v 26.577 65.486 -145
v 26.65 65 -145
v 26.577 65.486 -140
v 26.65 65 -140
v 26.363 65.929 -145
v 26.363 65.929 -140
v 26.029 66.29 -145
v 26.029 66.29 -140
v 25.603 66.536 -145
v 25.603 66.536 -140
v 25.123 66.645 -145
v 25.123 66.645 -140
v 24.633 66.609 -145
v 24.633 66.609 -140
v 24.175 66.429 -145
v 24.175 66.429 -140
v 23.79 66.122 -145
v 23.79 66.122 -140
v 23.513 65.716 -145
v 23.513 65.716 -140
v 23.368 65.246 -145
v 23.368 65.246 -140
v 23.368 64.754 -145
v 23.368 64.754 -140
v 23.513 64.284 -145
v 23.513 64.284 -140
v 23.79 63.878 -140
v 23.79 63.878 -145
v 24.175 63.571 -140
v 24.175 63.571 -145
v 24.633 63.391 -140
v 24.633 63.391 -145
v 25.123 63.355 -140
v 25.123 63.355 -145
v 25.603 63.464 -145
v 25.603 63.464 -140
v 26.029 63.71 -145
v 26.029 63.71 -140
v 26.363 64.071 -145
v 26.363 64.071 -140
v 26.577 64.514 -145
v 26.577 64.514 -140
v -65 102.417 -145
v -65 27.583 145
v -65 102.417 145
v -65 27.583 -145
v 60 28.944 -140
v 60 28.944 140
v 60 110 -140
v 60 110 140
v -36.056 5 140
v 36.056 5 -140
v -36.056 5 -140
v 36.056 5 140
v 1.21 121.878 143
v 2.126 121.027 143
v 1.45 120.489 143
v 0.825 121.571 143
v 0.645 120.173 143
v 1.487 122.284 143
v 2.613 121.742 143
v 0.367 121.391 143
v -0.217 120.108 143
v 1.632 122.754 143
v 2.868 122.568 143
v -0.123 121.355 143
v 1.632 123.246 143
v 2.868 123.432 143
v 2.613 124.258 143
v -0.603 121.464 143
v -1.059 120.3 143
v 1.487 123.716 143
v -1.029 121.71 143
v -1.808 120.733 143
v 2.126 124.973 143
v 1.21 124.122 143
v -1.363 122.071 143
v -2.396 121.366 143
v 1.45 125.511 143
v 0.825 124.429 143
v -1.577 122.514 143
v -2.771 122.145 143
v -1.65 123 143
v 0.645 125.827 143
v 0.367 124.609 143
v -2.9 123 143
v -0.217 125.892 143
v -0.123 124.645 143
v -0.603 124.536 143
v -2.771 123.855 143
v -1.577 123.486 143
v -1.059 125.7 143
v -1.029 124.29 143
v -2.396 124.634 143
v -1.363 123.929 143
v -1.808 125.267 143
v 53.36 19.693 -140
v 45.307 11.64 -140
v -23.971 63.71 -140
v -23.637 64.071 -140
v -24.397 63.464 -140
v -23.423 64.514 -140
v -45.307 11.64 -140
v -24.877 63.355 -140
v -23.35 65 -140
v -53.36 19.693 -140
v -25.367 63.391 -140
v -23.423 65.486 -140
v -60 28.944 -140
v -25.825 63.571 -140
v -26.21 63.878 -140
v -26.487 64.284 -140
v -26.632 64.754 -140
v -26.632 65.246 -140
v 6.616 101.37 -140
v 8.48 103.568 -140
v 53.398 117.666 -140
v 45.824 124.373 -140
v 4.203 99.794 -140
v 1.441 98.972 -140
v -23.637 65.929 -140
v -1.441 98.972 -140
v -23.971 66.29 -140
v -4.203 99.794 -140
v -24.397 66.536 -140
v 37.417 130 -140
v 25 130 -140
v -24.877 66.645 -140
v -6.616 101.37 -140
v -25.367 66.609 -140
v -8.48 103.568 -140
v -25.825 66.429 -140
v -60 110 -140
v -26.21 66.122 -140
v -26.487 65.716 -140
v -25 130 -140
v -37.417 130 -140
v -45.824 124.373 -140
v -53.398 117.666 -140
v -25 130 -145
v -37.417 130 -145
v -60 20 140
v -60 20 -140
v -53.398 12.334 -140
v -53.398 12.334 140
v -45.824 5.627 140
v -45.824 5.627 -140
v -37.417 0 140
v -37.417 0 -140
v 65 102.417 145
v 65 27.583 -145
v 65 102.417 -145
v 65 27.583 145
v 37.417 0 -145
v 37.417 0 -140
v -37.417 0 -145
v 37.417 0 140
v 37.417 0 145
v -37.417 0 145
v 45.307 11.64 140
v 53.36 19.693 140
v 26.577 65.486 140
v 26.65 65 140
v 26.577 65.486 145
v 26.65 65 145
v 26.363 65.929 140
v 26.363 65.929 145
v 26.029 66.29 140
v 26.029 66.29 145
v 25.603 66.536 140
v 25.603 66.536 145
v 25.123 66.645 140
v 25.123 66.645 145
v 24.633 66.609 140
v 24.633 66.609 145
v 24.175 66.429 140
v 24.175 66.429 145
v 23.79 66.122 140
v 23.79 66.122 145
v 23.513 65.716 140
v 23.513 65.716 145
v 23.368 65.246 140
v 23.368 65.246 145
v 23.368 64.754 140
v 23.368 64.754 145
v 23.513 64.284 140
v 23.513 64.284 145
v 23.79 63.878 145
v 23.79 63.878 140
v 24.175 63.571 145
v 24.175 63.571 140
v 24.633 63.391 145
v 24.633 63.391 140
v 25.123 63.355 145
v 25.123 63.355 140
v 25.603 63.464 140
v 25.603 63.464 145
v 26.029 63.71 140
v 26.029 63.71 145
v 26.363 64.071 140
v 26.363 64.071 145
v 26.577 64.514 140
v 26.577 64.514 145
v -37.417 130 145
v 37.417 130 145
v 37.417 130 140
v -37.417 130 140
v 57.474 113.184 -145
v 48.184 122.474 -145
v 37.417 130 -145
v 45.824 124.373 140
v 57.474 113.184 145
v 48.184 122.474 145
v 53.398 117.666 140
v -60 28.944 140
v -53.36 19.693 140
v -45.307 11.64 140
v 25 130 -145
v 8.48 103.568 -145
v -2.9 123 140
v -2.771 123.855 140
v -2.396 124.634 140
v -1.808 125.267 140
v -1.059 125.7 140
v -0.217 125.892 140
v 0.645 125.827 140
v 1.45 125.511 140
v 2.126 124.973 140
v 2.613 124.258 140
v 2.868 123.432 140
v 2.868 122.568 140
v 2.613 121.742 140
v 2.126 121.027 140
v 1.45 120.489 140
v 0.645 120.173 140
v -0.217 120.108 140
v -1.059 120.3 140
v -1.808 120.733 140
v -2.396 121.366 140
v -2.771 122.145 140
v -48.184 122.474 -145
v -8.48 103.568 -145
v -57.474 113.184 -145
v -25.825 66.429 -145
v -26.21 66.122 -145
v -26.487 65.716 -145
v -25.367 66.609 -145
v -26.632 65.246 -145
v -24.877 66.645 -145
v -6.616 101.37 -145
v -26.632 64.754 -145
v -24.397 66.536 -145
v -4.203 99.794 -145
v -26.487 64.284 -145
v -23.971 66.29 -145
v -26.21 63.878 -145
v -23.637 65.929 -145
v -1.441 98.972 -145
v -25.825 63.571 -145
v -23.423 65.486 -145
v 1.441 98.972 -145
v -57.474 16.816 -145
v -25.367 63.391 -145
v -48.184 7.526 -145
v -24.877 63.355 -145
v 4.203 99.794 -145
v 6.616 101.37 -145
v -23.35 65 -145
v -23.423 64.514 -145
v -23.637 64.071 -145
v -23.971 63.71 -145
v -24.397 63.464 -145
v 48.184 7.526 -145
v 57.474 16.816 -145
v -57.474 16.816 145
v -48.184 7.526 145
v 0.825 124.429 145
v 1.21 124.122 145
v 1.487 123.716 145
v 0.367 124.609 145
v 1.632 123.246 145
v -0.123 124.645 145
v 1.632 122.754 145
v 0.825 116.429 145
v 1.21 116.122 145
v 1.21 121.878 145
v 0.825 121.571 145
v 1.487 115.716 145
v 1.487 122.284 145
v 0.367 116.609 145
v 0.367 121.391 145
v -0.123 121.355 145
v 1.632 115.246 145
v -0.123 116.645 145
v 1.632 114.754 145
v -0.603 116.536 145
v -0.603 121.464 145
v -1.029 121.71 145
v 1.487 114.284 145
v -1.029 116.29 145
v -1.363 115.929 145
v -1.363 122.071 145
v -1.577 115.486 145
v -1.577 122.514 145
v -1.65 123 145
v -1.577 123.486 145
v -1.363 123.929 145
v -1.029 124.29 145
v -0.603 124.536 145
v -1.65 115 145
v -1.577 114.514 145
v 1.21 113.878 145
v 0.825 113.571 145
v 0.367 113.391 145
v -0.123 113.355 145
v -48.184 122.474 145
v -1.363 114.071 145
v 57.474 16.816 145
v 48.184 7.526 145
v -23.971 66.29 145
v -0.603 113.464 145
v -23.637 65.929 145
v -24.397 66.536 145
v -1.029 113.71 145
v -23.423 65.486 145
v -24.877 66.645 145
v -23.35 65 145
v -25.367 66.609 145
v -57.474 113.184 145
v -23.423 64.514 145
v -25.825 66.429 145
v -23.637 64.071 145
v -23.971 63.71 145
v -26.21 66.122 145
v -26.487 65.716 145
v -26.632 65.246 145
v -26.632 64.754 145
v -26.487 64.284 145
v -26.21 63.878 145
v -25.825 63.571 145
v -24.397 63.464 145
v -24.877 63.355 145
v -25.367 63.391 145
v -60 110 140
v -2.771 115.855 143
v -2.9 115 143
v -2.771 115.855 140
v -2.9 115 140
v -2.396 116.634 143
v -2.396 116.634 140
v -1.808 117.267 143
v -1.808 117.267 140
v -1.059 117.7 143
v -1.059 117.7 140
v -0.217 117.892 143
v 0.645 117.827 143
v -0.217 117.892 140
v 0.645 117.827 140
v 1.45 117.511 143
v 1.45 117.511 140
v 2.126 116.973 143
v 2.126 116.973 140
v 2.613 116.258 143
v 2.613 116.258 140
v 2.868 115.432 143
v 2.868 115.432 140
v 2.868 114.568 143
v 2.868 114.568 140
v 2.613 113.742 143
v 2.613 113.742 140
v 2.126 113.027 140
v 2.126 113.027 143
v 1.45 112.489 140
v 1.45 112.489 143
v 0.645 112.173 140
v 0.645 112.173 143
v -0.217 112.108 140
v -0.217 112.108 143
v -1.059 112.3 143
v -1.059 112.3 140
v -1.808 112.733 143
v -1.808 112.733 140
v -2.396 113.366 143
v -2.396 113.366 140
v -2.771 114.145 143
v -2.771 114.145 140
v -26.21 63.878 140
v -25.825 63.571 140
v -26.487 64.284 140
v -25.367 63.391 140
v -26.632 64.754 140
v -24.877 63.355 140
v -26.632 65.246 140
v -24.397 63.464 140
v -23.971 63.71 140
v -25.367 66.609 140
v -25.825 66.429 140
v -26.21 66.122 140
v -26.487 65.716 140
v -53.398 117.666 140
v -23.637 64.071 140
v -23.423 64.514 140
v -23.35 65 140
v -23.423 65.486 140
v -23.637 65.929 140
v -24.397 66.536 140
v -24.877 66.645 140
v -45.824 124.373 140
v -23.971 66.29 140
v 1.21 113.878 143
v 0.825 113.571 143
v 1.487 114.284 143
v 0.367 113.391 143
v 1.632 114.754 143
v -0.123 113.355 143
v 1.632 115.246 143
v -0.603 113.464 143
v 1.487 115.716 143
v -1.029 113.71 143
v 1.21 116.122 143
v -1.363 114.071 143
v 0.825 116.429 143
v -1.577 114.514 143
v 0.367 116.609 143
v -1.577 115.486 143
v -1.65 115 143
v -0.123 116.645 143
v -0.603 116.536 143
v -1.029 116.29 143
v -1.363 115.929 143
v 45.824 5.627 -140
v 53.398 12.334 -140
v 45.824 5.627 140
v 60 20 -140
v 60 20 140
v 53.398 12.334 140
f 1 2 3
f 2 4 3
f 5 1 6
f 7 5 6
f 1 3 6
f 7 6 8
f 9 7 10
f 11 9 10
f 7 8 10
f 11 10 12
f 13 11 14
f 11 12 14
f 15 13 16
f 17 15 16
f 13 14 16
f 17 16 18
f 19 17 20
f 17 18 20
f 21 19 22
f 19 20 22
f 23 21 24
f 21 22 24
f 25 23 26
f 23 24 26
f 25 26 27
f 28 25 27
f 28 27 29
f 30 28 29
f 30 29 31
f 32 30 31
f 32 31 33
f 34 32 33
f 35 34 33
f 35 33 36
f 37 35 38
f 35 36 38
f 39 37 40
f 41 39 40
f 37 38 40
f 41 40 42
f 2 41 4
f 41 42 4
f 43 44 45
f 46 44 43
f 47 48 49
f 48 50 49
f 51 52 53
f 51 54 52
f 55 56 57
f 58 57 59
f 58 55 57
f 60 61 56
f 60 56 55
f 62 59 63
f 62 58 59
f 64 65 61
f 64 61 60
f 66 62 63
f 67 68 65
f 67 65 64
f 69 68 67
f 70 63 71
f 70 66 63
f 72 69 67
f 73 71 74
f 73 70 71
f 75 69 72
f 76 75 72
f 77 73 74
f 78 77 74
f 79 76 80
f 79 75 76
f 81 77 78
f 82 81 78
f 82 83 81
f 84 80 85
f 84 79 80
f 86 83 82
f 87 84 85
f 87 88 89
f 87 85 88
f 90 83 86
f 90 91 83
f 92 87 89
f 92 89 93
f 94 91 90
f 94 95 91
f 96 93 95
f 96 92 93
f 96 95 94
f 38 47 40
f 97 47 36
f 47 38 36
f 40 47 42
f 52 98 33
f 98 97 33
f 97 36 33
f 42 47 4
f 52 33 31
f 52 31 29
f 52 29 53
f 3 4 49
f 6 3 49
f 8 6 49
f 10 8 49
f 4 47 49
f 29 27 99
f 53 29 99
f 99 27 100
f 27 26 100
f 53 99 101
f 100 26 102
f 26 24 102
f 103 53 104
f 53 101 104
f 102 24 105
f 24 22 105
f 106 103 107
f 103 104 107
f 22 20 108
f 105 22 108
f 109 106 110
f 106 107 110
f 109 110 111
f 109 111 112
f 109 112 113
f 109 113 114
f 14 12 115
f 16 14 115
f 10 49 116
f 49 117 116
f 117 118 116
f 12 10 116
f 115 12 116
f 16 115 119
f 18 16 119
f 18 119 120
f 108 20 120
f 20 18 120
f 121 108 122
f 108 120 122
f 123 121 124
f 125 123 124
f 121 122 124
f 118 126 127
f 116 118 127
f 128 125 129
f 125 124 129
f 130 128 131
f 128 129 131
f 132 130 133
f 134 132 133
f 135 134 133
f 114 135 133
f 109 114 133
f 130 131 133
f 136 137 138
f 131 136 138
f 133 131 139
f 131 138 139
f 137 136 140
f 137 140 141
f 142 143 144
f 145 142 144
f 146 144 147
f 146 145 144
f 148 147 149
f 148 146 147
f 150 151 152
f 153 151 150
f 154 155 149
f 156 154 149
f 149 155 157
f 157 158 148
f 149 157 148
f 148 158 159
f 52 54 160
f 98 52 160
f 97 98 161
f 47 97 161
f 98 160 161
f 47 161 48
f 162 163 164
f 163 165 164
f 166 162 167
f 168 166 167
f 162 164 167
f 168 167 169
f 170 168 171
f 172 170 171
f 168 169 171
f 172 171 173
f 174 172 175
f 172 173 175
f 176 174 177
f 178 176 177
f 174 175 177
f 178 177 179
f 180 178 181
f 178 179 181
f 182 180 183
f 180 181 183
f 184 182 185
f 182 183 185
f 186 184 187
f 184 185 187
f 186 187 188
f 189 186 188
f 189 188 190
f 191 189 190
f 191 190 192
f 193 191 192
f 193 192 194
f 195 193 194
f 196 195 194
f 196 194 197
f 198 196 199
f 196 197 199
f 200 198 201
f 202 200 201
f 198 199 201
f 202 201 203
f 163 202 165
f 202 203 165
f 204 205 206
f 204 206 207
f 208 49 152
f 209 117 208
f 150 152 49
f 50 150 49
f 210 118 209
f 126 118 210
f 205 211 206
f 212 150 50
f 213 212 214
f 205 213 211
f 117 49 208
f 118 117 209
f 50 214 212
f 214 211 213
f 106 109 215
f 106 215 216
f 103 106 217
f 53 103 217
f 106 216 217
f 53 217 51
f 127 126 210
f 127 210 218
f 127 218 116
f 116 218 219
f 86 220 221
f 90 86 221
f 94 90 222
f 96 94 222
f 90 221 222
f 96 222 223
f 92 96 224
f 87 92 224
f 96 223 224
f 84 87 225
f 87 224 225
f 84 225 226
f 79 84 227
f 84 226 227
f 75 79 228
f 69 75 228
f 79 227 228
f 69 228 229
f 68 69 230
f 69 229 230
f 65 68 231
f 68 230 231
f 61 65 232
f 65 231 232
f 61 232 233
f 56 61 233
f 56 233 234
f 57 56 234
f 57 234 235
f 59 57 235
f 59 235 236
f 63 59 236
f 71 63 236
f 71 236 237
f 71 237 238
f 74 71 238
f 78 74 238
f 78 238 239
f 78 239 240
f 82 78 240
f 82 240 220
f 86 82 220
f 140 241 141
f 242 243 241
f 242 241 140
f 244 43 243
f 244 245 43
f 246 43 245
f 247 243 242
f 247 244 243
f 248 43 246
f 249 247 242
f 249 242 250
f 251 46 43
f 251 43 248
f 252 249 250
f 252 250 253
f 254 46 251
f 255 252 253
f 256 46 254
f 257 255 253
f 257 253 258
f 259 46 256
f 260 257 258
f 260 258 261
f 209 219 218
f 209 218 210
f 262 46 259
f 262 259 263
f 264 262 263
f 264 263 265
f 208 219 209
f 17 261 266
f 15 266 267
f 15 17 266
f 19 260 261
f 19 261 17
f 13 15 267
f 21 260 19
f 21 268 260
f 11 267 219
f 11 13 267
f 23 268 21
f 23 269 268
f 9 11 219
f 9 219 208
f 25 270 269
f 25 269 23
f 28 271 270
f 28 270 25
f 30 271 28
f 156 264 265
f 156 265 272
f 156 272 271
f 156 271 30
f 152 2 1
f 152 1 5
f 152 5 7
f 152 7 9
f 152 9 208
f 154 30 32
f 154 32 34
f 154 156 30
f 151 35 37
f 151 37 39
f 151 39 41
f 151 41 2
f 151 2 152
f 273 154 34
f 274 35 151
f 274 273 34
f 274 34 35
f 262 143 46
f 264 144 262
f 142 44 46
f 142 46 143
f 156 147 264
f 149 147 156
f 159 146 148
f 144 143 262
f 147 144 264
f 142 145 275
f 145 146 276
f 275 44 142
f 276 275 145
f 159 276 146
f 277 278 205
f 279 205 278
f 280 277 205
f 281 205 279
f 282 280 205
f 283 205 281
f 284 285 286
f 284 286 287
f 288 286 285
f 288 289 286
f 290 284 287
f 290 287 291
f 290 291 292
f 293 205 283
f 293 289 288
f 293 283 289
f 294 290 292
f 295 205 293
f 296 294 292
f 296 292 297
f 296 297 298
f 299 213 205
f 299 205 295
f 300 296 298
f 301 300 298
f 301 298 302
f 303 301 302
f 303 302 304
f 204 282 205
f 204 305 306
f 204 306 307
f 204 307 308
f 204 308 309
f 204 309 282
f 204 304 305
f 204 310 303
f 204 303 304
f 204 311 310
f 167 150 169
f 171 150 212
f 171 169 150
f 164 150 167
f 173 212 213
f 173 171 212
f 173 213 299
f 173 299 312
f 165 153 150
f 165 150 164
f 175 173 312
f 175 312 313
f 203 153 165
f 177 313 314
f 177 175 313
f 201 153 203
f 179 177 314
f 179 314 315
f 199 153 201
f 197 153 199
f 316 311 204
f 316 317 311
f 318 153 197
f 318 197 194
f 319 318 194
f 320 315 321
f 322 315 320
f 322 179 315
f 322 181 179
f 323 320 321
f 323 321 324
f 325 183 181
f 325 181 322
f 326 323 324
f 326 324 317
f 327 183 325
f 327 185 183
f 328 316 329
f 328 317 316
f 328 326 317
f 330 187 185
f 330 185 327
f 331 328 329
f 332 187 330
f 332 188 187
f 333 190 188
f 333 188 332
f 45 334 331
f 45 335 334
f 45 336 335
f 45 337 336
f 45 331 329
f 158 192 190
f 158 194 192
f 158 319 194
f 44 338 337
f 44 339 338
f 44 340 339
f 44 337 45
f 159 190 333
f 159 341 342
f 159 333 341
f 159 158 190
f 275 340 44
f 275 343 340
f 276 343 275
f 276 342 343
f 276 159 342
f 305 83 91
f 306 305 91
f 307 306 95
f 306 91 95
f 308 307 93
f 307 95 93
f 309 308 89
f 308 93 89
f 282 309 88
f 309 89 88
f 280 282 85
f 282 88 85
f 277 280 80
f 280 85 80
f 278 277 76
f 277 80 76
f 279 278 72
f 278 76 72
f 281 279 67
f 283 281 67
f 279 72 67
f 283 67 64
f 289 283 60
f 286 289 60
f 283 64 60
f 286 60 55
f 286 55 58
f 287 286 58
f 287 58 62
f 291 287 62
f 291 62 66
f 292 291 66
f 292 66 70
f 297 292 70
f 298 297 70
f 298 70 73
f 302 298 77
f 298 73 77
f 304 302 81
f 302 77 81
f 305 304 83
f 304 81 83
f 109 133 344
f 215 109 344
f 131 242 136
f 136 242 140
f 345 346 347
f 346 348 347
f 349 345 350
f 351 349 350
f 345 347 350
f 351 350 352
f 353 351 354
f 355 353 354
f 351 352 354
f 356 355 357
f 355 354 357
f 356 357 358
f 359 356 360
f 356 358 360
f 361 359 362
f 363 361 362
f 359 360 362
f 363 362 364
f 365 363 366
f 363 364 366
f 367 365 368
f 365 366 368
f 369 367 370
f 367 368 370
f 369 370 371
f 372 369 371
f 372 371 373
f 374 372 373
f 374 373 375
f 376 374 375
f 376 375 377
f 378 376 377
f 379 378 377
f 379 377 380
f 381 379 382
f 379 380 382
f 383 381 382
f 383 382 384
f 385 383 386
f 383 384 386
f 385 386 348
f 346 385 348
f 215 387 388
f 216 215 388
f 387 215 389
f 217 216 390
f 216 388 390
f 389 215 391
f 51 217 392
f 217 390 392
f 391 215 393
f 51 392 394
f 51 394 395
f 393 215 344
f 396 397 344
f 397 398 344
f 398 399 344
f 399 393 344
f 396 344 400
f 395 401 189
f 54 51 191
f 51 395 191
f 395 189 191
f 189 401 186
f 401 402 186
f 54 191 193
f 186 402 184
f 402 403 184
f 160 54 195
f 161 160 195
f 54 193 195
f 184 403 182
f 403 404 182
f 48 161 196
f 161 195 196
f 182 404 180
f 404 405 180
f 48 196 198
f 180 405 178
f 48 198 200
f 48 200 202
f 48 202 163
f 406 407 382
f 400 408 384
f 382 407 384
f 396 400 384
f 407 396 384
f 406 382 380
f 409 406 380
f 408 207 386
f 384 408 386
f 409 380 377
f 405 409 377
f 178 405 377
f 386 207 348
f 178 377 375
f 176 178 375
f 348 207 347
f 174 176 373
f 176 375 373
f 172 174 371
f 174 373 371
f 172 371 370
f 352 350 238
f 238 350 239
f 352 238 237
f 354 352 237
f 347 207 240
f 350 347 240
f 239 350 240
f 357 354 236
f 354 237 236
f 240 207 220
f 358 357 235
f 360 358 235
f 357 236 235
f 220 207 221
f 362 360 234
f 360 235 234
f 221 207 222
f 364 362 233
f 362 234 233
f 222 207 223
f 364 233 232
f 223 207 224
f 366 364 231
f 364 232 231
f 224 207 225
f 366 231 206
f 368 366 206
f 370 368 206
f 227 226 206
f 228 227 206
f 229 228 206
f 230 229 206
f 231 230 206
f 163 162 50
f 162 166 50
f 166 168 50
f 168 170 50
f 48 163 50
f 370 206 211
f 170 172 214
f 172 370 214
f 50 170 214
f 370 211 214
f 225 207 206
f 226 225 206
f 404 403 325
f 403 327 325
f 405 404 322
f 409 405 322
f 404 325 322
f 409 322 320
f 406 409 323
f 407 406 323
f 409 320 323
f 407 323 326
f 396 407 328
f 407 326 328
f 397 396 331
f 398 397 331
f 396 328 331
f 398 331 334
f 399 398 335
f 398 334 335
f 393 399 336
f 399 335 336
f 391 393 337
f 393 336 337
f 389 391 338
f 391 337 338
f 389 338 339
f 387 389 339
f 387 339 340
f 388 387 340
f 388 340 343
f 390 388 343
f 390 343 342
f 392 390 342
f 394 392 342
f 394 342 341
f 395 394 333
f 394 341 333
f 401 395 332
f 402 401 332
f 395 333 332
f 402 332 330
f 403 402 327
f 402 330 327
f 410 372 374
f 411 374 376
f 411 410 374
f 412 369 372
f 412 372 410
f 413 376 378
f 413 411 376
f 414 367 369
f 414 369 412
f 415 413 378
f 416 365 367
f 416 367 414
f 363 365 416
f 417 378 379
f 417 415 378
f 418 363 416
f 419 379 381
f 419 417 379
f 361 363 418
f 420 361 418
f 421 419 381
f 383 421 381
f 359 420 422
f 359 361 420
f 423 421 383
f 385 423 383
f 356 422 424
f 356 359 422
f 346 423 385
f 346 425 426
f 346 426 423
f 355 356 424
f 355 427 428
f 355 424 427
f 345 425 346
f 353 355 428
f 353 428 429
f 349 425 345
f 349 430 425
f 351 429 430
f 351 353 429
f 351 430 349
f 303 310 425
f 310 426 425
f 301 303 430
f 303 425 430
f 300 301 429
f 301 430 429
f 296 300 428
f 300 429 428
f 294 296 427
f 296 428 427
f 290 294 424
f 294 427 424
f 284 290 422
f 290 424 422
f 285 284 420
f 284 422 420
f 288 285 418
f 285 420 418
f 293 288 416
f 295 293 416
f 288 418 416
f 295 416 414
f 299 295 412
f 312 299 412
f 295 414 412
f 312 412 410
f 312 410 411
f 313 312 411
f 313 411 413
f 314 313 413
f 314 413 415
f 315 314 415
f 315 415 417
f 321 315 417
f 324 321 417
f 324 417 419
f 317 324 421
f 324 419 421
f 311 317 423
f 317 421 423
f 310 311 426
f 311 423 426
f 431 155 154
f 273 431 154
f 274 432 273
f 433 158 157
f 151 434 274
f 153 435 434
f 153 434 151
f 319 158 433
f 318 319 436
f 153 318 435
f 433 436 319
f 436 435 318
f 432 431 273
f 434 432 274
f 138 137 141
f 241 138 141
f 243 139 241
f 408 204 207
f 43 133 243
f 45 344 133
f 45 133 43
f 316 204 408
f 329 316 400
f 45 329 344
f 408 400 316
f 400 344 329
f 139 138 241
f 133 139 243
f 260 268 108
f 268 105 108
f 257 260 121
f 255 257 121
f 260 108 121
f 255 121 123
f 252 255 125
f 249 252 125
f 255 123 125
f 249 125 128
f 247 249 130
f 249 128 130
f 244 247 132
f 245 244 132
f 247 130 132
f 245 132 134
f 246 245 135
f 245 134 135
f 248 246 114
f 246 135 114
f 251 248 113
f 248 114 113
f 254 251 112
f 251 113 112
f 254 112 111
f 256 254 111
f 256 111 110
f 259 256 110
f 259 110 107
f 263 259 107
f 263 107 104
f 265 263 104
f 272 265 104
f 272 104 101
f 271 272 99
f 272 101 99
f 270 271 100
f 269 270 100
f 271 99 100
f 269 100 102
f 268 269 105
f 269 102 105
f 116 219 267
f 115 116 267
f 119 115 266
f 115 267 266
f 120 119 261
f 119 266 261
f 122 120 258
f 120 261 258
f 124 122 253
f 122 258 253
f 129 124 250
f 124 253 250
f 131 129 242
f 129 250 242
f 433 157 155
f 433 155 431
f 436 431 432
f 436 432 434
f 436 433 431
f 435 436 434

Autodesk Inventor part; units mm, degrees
ref_plane "YZ Plane" through (0, 0, 0) normal (1, 0, 0) x (0, 1, 0)
ref_plane "XZ Plane" through (0, 0, 0) normal (0, 1, 0) x (-1, 0, 0)
ref_plane "XY Plane" through (0, 0, 0) normal (0, 0, 1) x (1, 0, 0)
sketch "Sketch1" plane through (0, 0, 0) normal (0, 1, 0) x (-1, 0, 0)
  line L0 (-65, 145) -> (65, 145)
  line L1 (65, 145) -> (65, -145)
  line L2 (65, -145) -> (-65, -145)
  line L3 (-65, -145) -> (-65, 145)
  line L4 (-65, 145) -> (65, -145) construction
  line L5 (65, 145) -> (-65, -145) construction
  point P0 (0, 0)
  dimension "d0" = 130
  dimension "d1" = 290
extrude "Extrusion1" add sketch "Sketch1" along normal blind 130
sketch "Sketch2" plane through (-65, 0, 145) normal (0, 0, 1) x (1, 0, 0)
  line L0 (0, 0) -> (130, 0) projected
  line L1 (130, 0) -> (130, 130) projected
  line L2 (0, 130) -> (130, 130) projected
  line L3 (0, 0) -> (0, 130) projected
  circle A0 centre (65, 65) radius 75
  point P0 (65, 0)
  point P1 (130, 65)
  point P2 (65, 130)
  point P3 (27.5834, 0)
  point P4 (0, 27.5834)
  point P5 (130, 27.5834)
  point P6 (102.4166, 0)
  point P7 (0, 102.4166)
  point P8 (27.5834, 130)
  point P9 (102.4166, 130)
  point P10 (130, 102.4166)
  dimension "d4" = 150
extrude "Extrusion2" cut sketch "Sketch2" against normal through all contours L3 A0 L0 | A0 L1 L0 | L3 L2 A0 | A0 L2 L1
sketch "Sketch3" plane through (0, 130, 0) normal (0, 1, 0) x (1, 0, 0)
  line L0 (-37.4166, 145) -> (-37.4166, -145) projected
  line L1 (-37.4166, -145) -> (37.4166, -145) projected
  line L2 (37.4166, -145) -> (37.4166, 145) projected
  line L3 (37.4166, 145) -> (-37.4166, 145) projected
  line L4 (37.4166, 145) -> (65, 145) projected
  line L5 (37.4166, -145) -> (37.4166, 145) projected
  line L6 (65, -145) -> (37.4166, -145) projected
  line L7 (65, 145) -> (65, -145) projected
  line L8 (-65, 145) -> (-37.4166, 145) projected
  line L9 (-65, -145) -> (-65, 145) projected
  line L10 (-37.4166, -145) -> (-65, -145) projected
  line L11 (-37.4166, 145) -> (-37.4166, -145) projected
  line L12 (-60, -140) -> (60, -140)
  line L13 (60, -140) -> (60, 140)
  line L14 (60, 140) -> (-60, 140)
  line L15 (-60, 140) -> (-60, -140)
  line L16 (-60, -140) -> (60, 140) construction
  line L17 (60, -140) -> (-60, 140) construction
  point P0 (0, 0)
  dimension "d7" = 5
  dimension "d8" = 5
extrude "Extrusion3" cut sketch "Sketch3" against normal through all contours L14 L2 L12 L0 | L0 L12 L15 L14 | L14 L13 L12 L2
sketch "Sketch4" plane through (-37.4166, 0, 145) normal (0, 0, 1) x (1, 0, 0)
  arc A0 (74.8331, 0) -> (102.4166, 27.5834) centre (37.4166, 65) ccw projected
  line L0 (102.4166, 27.5834) -> (102.4166, 102.4166) projected
  arc A1 (102.4166, 102.4166) -> (74.8331, 130) centre (37.4166, 65) ccw projected
  line L1 (0, 130) -> (74.8331, 130) projected
  arc A2 (0, 130) -> (-27.5834, 102.4166) centre (37.4166, 65) ccw projected
  line L2 (-27.5834, 27.5834) -> (-27.5834, 102.4166) projected
  arc A3 (-27.5834, 27.5834) -> (0, 0) centre (37.4166, 65) ccw projected
  line L3 (0, 0) -> (74.8331, 0) projected
  arc A4 (-22.5834, 28.9445) -> (1.3611, 5) centre (37.4166, 65) ccw
  line L4 (-22.5834, 28.9445) -> (-22.5834, 101.0555)
  arc A5 (1.3611, 125) -> (-22.5834, 101.0555) centre (37.4166, 65) ccw
  line L5 (1.3611, 125) -> (73.4721, 125)
  arc A6 (97.4166, 101.0555) -> (73.4721, 125) centre (37.4166, 65) ccw
  line L6 (97.4166, 101.0555) -> (97.4166, 28.9445)
  arc A7 (73.4721, 5) -> (97.4166, 28.9445) centre (37.4166, 65) ccw
  line L7 (73.4721, 5) -> (1.3611, 5)
  line L8 (-27.5834, 27.5834) -> (-22.5834, 28.9445)
  line L9 (97.4166, 28.9445) -> (102.4166, 27.5834)
  point P0 (37.4166, 0)
  dimension "d11" = 5
extrude "Extrusion4" add sketch "Sketch4" against normal up to surface (290 mm away) contours L3 A3 L8 A4 L7 A7 L9 A0
sketch "Sketch5" plane through (-37.4166, 0, 145) normal (0, 0, 1) x (1, 0, 0)
  line L0 (102.4166, 27.5834) -> (102.4166, 102.4166) projected
  arc A0 (102.4166, 102.4166) -> (74.8331, 130) centre (37.4166, 65) ccw projected
  line L1 (0, 130) -> (74.8331, 130) projected
  arc A1 (0, 130) -> (-27.5834, 102.4166) centre (37.4166, 65) ccw projected
  line L2 (-27.5834, 27.5834) -> (-27.5834, 102.4166) projected
  arc A2 (-27.5834, 27.5834) -> (0, 0) centre (37.4166, 65) ccw projected
  line L3 (0, 0) -> (74.8331, 0) projected
  arc A3 (74.8331, 0) -> (102.4166, 27.5834) centre (37.4166, 65) ccw projected
  line L4 (12.4166, 65) -> (62.4166, 65) construction
  circle A4 centre (62.4166, 65) radius 1.65
  circle A5 centre (12.4166, 65) radius 1.65
  point P0 (37.4166, 0)
  dimension "d14" = 3.3
  dimension "d15" = 3.3
  dimension "d16" = 50
extrude "Extrusion5" cut sketch "Sketch5" against normal through all contours A4 | A5
sketch "Sketch7" plane through (37.4166, 0, -145) normal (0, 0, -1) x (-1, 0, 0)
  circle A0 centre (12.4166, 65) radius 1.65 projected
  circle A1 centre (62.4166, 65) radius 1.65 projected
  arc A2 (-27.5834, 27.5834) -> (0, 0) centre (37.4166, 65) ccw projected
  line L0 (0, 0) -> (74.8331, 0) projected
  arc A3 (74.8331, 0) -> (102.4166, 27.5834) centre (37.4166, 65) ccw projected
  line L1 (102.4166, 27.5834) -> (102.4166, 102.4166) projected
  arc A4 (102.4166, 102.4166) -> (74.8331, 130) centre (37.4166, 65) ccw projected
  line L2 (0, 130) -> (74.8331, 130) projected
  arc A5 (0, 130) -> (-27.5834, 102.4166) centre (37.4166, 65) ccw projected
  line L3 (-27.5834, 27.5834) -> (-27.5834, 102.4166) projected
  line L4 (12.4166, 130) -> (28.9366, 103.568)
  line L5 (45.8966, 103.568) -> (62.4166, 130)
  arc A6 (28.9366, 103.568) -> (45.8966, 103.568) centre (37.4166, 108.868) ccw
  point P0 (37.4166, 0)
  point P1 (37.4166, 90)
  dimension "d24" = 50
  dimension "d25" = 40
  dimension "d26" = 10
extrude "Extrusion7" cut sketch "Sketch7" against normal blind 10 contours L2 L5 A6 L4
sketch "Sketch10" plane through (37.4166, 130, 140) normal (0, 0, -1) x (-1, 0, 0)
  circle A0 centre (12.4166, -65) radius 1.65 projected
  circle A1 centre (62.4166, -65) radius 1.65 projected
  arc A2 (73.4721, -125) -> (97.4166, -101.0555) centre (37.4166, -65) ccw projected
  line L0 (97.4166, -20) -> (97.4166, -101.0555) projected
  arc A3 (97.4166, -20) -> (74.8331, 0) centre (37.4166, -65) ccw projected
  line L1 (0, 0) -> (74.8331, 0) projected
  arc A4 (0, 0) -> (-22.5834, -20) centre (37.4166, -65) ccw projected
  line L2 (-22.5834, -20) -> (-22.5834, -101.0555) projected
  arc A5 (-22.5834, -101.0555) -> (1.3611, -125) centre (37.4166, -65) ccw projected
  line L3 (1.3611, -125) -> (73.4721, -125) projected
  circle A6 centre (37.4166, -7) radius 1.65
  circle A7 centre (37.4166, -15) radius 1.65
  point P0 (37.4166, -130)
  point P1 (37.4166, 0)
  dimension "d36" = 3.3
  dimension "d37" = 3.3
  dimension "d38" = 8
  dimension "d39" = 7
extrude "Extrusion10" cut sketch "Sketch10" against normal through all contours A6 | A7
sketch "Sketch11" plane through (37.4166, 130, 140) normal (0, 0, -1) x (-1, 0, 0)
  circle A0 centre (37.4166, -15) radius 1.65 projected
  circle A1 centre (37.4166, -7) radius 1.65 projected
  circle A2 centre (12.4166, -65) radius 1.65 projected
  circle A3 centre (62.4166, -65) radius 1.65 projected
  arc A4 (73.4721, -125) -> (97.4166, -101.0555) centre (37.4166, -65) ccw projected
  line L0 (97.4166, -20) -> (97.4166, -101.0555) projected
  arc A5 (97.4166, -20) -> (74.8331, 0) centre (37.4166, -65) ccw projected
  line L1 (0, 0) -> (74.8331, 0) projected
  arc A6 (0, 0) -> (-22.5834, -20) centre (37.4166, -65) ccw projected
  line L2 (-22.5834, -20) -> (-22.5834, -101.0555) projected
  arc A7 (-22.5834, -101.0555) -> (1.3611, -125) centre (37.4166, -65) ccw projected
  line L3 (1.3611, -125) -> (73.4721, -125) projected
  circle A8 centre (37.4166, -7) radius 2.9
  circle A9 centre (37.4166, -15) radius 2.9
  point P0 (37.4166, -130)
  dimension "d42" = 5.8
extrude "Extrusion11" cut sketch "Sketch11" against normal blind 3 contours A0 | A1 | A8 | A9
properties part number "CAJA_V2" material "Steel, Mild, Welded"
